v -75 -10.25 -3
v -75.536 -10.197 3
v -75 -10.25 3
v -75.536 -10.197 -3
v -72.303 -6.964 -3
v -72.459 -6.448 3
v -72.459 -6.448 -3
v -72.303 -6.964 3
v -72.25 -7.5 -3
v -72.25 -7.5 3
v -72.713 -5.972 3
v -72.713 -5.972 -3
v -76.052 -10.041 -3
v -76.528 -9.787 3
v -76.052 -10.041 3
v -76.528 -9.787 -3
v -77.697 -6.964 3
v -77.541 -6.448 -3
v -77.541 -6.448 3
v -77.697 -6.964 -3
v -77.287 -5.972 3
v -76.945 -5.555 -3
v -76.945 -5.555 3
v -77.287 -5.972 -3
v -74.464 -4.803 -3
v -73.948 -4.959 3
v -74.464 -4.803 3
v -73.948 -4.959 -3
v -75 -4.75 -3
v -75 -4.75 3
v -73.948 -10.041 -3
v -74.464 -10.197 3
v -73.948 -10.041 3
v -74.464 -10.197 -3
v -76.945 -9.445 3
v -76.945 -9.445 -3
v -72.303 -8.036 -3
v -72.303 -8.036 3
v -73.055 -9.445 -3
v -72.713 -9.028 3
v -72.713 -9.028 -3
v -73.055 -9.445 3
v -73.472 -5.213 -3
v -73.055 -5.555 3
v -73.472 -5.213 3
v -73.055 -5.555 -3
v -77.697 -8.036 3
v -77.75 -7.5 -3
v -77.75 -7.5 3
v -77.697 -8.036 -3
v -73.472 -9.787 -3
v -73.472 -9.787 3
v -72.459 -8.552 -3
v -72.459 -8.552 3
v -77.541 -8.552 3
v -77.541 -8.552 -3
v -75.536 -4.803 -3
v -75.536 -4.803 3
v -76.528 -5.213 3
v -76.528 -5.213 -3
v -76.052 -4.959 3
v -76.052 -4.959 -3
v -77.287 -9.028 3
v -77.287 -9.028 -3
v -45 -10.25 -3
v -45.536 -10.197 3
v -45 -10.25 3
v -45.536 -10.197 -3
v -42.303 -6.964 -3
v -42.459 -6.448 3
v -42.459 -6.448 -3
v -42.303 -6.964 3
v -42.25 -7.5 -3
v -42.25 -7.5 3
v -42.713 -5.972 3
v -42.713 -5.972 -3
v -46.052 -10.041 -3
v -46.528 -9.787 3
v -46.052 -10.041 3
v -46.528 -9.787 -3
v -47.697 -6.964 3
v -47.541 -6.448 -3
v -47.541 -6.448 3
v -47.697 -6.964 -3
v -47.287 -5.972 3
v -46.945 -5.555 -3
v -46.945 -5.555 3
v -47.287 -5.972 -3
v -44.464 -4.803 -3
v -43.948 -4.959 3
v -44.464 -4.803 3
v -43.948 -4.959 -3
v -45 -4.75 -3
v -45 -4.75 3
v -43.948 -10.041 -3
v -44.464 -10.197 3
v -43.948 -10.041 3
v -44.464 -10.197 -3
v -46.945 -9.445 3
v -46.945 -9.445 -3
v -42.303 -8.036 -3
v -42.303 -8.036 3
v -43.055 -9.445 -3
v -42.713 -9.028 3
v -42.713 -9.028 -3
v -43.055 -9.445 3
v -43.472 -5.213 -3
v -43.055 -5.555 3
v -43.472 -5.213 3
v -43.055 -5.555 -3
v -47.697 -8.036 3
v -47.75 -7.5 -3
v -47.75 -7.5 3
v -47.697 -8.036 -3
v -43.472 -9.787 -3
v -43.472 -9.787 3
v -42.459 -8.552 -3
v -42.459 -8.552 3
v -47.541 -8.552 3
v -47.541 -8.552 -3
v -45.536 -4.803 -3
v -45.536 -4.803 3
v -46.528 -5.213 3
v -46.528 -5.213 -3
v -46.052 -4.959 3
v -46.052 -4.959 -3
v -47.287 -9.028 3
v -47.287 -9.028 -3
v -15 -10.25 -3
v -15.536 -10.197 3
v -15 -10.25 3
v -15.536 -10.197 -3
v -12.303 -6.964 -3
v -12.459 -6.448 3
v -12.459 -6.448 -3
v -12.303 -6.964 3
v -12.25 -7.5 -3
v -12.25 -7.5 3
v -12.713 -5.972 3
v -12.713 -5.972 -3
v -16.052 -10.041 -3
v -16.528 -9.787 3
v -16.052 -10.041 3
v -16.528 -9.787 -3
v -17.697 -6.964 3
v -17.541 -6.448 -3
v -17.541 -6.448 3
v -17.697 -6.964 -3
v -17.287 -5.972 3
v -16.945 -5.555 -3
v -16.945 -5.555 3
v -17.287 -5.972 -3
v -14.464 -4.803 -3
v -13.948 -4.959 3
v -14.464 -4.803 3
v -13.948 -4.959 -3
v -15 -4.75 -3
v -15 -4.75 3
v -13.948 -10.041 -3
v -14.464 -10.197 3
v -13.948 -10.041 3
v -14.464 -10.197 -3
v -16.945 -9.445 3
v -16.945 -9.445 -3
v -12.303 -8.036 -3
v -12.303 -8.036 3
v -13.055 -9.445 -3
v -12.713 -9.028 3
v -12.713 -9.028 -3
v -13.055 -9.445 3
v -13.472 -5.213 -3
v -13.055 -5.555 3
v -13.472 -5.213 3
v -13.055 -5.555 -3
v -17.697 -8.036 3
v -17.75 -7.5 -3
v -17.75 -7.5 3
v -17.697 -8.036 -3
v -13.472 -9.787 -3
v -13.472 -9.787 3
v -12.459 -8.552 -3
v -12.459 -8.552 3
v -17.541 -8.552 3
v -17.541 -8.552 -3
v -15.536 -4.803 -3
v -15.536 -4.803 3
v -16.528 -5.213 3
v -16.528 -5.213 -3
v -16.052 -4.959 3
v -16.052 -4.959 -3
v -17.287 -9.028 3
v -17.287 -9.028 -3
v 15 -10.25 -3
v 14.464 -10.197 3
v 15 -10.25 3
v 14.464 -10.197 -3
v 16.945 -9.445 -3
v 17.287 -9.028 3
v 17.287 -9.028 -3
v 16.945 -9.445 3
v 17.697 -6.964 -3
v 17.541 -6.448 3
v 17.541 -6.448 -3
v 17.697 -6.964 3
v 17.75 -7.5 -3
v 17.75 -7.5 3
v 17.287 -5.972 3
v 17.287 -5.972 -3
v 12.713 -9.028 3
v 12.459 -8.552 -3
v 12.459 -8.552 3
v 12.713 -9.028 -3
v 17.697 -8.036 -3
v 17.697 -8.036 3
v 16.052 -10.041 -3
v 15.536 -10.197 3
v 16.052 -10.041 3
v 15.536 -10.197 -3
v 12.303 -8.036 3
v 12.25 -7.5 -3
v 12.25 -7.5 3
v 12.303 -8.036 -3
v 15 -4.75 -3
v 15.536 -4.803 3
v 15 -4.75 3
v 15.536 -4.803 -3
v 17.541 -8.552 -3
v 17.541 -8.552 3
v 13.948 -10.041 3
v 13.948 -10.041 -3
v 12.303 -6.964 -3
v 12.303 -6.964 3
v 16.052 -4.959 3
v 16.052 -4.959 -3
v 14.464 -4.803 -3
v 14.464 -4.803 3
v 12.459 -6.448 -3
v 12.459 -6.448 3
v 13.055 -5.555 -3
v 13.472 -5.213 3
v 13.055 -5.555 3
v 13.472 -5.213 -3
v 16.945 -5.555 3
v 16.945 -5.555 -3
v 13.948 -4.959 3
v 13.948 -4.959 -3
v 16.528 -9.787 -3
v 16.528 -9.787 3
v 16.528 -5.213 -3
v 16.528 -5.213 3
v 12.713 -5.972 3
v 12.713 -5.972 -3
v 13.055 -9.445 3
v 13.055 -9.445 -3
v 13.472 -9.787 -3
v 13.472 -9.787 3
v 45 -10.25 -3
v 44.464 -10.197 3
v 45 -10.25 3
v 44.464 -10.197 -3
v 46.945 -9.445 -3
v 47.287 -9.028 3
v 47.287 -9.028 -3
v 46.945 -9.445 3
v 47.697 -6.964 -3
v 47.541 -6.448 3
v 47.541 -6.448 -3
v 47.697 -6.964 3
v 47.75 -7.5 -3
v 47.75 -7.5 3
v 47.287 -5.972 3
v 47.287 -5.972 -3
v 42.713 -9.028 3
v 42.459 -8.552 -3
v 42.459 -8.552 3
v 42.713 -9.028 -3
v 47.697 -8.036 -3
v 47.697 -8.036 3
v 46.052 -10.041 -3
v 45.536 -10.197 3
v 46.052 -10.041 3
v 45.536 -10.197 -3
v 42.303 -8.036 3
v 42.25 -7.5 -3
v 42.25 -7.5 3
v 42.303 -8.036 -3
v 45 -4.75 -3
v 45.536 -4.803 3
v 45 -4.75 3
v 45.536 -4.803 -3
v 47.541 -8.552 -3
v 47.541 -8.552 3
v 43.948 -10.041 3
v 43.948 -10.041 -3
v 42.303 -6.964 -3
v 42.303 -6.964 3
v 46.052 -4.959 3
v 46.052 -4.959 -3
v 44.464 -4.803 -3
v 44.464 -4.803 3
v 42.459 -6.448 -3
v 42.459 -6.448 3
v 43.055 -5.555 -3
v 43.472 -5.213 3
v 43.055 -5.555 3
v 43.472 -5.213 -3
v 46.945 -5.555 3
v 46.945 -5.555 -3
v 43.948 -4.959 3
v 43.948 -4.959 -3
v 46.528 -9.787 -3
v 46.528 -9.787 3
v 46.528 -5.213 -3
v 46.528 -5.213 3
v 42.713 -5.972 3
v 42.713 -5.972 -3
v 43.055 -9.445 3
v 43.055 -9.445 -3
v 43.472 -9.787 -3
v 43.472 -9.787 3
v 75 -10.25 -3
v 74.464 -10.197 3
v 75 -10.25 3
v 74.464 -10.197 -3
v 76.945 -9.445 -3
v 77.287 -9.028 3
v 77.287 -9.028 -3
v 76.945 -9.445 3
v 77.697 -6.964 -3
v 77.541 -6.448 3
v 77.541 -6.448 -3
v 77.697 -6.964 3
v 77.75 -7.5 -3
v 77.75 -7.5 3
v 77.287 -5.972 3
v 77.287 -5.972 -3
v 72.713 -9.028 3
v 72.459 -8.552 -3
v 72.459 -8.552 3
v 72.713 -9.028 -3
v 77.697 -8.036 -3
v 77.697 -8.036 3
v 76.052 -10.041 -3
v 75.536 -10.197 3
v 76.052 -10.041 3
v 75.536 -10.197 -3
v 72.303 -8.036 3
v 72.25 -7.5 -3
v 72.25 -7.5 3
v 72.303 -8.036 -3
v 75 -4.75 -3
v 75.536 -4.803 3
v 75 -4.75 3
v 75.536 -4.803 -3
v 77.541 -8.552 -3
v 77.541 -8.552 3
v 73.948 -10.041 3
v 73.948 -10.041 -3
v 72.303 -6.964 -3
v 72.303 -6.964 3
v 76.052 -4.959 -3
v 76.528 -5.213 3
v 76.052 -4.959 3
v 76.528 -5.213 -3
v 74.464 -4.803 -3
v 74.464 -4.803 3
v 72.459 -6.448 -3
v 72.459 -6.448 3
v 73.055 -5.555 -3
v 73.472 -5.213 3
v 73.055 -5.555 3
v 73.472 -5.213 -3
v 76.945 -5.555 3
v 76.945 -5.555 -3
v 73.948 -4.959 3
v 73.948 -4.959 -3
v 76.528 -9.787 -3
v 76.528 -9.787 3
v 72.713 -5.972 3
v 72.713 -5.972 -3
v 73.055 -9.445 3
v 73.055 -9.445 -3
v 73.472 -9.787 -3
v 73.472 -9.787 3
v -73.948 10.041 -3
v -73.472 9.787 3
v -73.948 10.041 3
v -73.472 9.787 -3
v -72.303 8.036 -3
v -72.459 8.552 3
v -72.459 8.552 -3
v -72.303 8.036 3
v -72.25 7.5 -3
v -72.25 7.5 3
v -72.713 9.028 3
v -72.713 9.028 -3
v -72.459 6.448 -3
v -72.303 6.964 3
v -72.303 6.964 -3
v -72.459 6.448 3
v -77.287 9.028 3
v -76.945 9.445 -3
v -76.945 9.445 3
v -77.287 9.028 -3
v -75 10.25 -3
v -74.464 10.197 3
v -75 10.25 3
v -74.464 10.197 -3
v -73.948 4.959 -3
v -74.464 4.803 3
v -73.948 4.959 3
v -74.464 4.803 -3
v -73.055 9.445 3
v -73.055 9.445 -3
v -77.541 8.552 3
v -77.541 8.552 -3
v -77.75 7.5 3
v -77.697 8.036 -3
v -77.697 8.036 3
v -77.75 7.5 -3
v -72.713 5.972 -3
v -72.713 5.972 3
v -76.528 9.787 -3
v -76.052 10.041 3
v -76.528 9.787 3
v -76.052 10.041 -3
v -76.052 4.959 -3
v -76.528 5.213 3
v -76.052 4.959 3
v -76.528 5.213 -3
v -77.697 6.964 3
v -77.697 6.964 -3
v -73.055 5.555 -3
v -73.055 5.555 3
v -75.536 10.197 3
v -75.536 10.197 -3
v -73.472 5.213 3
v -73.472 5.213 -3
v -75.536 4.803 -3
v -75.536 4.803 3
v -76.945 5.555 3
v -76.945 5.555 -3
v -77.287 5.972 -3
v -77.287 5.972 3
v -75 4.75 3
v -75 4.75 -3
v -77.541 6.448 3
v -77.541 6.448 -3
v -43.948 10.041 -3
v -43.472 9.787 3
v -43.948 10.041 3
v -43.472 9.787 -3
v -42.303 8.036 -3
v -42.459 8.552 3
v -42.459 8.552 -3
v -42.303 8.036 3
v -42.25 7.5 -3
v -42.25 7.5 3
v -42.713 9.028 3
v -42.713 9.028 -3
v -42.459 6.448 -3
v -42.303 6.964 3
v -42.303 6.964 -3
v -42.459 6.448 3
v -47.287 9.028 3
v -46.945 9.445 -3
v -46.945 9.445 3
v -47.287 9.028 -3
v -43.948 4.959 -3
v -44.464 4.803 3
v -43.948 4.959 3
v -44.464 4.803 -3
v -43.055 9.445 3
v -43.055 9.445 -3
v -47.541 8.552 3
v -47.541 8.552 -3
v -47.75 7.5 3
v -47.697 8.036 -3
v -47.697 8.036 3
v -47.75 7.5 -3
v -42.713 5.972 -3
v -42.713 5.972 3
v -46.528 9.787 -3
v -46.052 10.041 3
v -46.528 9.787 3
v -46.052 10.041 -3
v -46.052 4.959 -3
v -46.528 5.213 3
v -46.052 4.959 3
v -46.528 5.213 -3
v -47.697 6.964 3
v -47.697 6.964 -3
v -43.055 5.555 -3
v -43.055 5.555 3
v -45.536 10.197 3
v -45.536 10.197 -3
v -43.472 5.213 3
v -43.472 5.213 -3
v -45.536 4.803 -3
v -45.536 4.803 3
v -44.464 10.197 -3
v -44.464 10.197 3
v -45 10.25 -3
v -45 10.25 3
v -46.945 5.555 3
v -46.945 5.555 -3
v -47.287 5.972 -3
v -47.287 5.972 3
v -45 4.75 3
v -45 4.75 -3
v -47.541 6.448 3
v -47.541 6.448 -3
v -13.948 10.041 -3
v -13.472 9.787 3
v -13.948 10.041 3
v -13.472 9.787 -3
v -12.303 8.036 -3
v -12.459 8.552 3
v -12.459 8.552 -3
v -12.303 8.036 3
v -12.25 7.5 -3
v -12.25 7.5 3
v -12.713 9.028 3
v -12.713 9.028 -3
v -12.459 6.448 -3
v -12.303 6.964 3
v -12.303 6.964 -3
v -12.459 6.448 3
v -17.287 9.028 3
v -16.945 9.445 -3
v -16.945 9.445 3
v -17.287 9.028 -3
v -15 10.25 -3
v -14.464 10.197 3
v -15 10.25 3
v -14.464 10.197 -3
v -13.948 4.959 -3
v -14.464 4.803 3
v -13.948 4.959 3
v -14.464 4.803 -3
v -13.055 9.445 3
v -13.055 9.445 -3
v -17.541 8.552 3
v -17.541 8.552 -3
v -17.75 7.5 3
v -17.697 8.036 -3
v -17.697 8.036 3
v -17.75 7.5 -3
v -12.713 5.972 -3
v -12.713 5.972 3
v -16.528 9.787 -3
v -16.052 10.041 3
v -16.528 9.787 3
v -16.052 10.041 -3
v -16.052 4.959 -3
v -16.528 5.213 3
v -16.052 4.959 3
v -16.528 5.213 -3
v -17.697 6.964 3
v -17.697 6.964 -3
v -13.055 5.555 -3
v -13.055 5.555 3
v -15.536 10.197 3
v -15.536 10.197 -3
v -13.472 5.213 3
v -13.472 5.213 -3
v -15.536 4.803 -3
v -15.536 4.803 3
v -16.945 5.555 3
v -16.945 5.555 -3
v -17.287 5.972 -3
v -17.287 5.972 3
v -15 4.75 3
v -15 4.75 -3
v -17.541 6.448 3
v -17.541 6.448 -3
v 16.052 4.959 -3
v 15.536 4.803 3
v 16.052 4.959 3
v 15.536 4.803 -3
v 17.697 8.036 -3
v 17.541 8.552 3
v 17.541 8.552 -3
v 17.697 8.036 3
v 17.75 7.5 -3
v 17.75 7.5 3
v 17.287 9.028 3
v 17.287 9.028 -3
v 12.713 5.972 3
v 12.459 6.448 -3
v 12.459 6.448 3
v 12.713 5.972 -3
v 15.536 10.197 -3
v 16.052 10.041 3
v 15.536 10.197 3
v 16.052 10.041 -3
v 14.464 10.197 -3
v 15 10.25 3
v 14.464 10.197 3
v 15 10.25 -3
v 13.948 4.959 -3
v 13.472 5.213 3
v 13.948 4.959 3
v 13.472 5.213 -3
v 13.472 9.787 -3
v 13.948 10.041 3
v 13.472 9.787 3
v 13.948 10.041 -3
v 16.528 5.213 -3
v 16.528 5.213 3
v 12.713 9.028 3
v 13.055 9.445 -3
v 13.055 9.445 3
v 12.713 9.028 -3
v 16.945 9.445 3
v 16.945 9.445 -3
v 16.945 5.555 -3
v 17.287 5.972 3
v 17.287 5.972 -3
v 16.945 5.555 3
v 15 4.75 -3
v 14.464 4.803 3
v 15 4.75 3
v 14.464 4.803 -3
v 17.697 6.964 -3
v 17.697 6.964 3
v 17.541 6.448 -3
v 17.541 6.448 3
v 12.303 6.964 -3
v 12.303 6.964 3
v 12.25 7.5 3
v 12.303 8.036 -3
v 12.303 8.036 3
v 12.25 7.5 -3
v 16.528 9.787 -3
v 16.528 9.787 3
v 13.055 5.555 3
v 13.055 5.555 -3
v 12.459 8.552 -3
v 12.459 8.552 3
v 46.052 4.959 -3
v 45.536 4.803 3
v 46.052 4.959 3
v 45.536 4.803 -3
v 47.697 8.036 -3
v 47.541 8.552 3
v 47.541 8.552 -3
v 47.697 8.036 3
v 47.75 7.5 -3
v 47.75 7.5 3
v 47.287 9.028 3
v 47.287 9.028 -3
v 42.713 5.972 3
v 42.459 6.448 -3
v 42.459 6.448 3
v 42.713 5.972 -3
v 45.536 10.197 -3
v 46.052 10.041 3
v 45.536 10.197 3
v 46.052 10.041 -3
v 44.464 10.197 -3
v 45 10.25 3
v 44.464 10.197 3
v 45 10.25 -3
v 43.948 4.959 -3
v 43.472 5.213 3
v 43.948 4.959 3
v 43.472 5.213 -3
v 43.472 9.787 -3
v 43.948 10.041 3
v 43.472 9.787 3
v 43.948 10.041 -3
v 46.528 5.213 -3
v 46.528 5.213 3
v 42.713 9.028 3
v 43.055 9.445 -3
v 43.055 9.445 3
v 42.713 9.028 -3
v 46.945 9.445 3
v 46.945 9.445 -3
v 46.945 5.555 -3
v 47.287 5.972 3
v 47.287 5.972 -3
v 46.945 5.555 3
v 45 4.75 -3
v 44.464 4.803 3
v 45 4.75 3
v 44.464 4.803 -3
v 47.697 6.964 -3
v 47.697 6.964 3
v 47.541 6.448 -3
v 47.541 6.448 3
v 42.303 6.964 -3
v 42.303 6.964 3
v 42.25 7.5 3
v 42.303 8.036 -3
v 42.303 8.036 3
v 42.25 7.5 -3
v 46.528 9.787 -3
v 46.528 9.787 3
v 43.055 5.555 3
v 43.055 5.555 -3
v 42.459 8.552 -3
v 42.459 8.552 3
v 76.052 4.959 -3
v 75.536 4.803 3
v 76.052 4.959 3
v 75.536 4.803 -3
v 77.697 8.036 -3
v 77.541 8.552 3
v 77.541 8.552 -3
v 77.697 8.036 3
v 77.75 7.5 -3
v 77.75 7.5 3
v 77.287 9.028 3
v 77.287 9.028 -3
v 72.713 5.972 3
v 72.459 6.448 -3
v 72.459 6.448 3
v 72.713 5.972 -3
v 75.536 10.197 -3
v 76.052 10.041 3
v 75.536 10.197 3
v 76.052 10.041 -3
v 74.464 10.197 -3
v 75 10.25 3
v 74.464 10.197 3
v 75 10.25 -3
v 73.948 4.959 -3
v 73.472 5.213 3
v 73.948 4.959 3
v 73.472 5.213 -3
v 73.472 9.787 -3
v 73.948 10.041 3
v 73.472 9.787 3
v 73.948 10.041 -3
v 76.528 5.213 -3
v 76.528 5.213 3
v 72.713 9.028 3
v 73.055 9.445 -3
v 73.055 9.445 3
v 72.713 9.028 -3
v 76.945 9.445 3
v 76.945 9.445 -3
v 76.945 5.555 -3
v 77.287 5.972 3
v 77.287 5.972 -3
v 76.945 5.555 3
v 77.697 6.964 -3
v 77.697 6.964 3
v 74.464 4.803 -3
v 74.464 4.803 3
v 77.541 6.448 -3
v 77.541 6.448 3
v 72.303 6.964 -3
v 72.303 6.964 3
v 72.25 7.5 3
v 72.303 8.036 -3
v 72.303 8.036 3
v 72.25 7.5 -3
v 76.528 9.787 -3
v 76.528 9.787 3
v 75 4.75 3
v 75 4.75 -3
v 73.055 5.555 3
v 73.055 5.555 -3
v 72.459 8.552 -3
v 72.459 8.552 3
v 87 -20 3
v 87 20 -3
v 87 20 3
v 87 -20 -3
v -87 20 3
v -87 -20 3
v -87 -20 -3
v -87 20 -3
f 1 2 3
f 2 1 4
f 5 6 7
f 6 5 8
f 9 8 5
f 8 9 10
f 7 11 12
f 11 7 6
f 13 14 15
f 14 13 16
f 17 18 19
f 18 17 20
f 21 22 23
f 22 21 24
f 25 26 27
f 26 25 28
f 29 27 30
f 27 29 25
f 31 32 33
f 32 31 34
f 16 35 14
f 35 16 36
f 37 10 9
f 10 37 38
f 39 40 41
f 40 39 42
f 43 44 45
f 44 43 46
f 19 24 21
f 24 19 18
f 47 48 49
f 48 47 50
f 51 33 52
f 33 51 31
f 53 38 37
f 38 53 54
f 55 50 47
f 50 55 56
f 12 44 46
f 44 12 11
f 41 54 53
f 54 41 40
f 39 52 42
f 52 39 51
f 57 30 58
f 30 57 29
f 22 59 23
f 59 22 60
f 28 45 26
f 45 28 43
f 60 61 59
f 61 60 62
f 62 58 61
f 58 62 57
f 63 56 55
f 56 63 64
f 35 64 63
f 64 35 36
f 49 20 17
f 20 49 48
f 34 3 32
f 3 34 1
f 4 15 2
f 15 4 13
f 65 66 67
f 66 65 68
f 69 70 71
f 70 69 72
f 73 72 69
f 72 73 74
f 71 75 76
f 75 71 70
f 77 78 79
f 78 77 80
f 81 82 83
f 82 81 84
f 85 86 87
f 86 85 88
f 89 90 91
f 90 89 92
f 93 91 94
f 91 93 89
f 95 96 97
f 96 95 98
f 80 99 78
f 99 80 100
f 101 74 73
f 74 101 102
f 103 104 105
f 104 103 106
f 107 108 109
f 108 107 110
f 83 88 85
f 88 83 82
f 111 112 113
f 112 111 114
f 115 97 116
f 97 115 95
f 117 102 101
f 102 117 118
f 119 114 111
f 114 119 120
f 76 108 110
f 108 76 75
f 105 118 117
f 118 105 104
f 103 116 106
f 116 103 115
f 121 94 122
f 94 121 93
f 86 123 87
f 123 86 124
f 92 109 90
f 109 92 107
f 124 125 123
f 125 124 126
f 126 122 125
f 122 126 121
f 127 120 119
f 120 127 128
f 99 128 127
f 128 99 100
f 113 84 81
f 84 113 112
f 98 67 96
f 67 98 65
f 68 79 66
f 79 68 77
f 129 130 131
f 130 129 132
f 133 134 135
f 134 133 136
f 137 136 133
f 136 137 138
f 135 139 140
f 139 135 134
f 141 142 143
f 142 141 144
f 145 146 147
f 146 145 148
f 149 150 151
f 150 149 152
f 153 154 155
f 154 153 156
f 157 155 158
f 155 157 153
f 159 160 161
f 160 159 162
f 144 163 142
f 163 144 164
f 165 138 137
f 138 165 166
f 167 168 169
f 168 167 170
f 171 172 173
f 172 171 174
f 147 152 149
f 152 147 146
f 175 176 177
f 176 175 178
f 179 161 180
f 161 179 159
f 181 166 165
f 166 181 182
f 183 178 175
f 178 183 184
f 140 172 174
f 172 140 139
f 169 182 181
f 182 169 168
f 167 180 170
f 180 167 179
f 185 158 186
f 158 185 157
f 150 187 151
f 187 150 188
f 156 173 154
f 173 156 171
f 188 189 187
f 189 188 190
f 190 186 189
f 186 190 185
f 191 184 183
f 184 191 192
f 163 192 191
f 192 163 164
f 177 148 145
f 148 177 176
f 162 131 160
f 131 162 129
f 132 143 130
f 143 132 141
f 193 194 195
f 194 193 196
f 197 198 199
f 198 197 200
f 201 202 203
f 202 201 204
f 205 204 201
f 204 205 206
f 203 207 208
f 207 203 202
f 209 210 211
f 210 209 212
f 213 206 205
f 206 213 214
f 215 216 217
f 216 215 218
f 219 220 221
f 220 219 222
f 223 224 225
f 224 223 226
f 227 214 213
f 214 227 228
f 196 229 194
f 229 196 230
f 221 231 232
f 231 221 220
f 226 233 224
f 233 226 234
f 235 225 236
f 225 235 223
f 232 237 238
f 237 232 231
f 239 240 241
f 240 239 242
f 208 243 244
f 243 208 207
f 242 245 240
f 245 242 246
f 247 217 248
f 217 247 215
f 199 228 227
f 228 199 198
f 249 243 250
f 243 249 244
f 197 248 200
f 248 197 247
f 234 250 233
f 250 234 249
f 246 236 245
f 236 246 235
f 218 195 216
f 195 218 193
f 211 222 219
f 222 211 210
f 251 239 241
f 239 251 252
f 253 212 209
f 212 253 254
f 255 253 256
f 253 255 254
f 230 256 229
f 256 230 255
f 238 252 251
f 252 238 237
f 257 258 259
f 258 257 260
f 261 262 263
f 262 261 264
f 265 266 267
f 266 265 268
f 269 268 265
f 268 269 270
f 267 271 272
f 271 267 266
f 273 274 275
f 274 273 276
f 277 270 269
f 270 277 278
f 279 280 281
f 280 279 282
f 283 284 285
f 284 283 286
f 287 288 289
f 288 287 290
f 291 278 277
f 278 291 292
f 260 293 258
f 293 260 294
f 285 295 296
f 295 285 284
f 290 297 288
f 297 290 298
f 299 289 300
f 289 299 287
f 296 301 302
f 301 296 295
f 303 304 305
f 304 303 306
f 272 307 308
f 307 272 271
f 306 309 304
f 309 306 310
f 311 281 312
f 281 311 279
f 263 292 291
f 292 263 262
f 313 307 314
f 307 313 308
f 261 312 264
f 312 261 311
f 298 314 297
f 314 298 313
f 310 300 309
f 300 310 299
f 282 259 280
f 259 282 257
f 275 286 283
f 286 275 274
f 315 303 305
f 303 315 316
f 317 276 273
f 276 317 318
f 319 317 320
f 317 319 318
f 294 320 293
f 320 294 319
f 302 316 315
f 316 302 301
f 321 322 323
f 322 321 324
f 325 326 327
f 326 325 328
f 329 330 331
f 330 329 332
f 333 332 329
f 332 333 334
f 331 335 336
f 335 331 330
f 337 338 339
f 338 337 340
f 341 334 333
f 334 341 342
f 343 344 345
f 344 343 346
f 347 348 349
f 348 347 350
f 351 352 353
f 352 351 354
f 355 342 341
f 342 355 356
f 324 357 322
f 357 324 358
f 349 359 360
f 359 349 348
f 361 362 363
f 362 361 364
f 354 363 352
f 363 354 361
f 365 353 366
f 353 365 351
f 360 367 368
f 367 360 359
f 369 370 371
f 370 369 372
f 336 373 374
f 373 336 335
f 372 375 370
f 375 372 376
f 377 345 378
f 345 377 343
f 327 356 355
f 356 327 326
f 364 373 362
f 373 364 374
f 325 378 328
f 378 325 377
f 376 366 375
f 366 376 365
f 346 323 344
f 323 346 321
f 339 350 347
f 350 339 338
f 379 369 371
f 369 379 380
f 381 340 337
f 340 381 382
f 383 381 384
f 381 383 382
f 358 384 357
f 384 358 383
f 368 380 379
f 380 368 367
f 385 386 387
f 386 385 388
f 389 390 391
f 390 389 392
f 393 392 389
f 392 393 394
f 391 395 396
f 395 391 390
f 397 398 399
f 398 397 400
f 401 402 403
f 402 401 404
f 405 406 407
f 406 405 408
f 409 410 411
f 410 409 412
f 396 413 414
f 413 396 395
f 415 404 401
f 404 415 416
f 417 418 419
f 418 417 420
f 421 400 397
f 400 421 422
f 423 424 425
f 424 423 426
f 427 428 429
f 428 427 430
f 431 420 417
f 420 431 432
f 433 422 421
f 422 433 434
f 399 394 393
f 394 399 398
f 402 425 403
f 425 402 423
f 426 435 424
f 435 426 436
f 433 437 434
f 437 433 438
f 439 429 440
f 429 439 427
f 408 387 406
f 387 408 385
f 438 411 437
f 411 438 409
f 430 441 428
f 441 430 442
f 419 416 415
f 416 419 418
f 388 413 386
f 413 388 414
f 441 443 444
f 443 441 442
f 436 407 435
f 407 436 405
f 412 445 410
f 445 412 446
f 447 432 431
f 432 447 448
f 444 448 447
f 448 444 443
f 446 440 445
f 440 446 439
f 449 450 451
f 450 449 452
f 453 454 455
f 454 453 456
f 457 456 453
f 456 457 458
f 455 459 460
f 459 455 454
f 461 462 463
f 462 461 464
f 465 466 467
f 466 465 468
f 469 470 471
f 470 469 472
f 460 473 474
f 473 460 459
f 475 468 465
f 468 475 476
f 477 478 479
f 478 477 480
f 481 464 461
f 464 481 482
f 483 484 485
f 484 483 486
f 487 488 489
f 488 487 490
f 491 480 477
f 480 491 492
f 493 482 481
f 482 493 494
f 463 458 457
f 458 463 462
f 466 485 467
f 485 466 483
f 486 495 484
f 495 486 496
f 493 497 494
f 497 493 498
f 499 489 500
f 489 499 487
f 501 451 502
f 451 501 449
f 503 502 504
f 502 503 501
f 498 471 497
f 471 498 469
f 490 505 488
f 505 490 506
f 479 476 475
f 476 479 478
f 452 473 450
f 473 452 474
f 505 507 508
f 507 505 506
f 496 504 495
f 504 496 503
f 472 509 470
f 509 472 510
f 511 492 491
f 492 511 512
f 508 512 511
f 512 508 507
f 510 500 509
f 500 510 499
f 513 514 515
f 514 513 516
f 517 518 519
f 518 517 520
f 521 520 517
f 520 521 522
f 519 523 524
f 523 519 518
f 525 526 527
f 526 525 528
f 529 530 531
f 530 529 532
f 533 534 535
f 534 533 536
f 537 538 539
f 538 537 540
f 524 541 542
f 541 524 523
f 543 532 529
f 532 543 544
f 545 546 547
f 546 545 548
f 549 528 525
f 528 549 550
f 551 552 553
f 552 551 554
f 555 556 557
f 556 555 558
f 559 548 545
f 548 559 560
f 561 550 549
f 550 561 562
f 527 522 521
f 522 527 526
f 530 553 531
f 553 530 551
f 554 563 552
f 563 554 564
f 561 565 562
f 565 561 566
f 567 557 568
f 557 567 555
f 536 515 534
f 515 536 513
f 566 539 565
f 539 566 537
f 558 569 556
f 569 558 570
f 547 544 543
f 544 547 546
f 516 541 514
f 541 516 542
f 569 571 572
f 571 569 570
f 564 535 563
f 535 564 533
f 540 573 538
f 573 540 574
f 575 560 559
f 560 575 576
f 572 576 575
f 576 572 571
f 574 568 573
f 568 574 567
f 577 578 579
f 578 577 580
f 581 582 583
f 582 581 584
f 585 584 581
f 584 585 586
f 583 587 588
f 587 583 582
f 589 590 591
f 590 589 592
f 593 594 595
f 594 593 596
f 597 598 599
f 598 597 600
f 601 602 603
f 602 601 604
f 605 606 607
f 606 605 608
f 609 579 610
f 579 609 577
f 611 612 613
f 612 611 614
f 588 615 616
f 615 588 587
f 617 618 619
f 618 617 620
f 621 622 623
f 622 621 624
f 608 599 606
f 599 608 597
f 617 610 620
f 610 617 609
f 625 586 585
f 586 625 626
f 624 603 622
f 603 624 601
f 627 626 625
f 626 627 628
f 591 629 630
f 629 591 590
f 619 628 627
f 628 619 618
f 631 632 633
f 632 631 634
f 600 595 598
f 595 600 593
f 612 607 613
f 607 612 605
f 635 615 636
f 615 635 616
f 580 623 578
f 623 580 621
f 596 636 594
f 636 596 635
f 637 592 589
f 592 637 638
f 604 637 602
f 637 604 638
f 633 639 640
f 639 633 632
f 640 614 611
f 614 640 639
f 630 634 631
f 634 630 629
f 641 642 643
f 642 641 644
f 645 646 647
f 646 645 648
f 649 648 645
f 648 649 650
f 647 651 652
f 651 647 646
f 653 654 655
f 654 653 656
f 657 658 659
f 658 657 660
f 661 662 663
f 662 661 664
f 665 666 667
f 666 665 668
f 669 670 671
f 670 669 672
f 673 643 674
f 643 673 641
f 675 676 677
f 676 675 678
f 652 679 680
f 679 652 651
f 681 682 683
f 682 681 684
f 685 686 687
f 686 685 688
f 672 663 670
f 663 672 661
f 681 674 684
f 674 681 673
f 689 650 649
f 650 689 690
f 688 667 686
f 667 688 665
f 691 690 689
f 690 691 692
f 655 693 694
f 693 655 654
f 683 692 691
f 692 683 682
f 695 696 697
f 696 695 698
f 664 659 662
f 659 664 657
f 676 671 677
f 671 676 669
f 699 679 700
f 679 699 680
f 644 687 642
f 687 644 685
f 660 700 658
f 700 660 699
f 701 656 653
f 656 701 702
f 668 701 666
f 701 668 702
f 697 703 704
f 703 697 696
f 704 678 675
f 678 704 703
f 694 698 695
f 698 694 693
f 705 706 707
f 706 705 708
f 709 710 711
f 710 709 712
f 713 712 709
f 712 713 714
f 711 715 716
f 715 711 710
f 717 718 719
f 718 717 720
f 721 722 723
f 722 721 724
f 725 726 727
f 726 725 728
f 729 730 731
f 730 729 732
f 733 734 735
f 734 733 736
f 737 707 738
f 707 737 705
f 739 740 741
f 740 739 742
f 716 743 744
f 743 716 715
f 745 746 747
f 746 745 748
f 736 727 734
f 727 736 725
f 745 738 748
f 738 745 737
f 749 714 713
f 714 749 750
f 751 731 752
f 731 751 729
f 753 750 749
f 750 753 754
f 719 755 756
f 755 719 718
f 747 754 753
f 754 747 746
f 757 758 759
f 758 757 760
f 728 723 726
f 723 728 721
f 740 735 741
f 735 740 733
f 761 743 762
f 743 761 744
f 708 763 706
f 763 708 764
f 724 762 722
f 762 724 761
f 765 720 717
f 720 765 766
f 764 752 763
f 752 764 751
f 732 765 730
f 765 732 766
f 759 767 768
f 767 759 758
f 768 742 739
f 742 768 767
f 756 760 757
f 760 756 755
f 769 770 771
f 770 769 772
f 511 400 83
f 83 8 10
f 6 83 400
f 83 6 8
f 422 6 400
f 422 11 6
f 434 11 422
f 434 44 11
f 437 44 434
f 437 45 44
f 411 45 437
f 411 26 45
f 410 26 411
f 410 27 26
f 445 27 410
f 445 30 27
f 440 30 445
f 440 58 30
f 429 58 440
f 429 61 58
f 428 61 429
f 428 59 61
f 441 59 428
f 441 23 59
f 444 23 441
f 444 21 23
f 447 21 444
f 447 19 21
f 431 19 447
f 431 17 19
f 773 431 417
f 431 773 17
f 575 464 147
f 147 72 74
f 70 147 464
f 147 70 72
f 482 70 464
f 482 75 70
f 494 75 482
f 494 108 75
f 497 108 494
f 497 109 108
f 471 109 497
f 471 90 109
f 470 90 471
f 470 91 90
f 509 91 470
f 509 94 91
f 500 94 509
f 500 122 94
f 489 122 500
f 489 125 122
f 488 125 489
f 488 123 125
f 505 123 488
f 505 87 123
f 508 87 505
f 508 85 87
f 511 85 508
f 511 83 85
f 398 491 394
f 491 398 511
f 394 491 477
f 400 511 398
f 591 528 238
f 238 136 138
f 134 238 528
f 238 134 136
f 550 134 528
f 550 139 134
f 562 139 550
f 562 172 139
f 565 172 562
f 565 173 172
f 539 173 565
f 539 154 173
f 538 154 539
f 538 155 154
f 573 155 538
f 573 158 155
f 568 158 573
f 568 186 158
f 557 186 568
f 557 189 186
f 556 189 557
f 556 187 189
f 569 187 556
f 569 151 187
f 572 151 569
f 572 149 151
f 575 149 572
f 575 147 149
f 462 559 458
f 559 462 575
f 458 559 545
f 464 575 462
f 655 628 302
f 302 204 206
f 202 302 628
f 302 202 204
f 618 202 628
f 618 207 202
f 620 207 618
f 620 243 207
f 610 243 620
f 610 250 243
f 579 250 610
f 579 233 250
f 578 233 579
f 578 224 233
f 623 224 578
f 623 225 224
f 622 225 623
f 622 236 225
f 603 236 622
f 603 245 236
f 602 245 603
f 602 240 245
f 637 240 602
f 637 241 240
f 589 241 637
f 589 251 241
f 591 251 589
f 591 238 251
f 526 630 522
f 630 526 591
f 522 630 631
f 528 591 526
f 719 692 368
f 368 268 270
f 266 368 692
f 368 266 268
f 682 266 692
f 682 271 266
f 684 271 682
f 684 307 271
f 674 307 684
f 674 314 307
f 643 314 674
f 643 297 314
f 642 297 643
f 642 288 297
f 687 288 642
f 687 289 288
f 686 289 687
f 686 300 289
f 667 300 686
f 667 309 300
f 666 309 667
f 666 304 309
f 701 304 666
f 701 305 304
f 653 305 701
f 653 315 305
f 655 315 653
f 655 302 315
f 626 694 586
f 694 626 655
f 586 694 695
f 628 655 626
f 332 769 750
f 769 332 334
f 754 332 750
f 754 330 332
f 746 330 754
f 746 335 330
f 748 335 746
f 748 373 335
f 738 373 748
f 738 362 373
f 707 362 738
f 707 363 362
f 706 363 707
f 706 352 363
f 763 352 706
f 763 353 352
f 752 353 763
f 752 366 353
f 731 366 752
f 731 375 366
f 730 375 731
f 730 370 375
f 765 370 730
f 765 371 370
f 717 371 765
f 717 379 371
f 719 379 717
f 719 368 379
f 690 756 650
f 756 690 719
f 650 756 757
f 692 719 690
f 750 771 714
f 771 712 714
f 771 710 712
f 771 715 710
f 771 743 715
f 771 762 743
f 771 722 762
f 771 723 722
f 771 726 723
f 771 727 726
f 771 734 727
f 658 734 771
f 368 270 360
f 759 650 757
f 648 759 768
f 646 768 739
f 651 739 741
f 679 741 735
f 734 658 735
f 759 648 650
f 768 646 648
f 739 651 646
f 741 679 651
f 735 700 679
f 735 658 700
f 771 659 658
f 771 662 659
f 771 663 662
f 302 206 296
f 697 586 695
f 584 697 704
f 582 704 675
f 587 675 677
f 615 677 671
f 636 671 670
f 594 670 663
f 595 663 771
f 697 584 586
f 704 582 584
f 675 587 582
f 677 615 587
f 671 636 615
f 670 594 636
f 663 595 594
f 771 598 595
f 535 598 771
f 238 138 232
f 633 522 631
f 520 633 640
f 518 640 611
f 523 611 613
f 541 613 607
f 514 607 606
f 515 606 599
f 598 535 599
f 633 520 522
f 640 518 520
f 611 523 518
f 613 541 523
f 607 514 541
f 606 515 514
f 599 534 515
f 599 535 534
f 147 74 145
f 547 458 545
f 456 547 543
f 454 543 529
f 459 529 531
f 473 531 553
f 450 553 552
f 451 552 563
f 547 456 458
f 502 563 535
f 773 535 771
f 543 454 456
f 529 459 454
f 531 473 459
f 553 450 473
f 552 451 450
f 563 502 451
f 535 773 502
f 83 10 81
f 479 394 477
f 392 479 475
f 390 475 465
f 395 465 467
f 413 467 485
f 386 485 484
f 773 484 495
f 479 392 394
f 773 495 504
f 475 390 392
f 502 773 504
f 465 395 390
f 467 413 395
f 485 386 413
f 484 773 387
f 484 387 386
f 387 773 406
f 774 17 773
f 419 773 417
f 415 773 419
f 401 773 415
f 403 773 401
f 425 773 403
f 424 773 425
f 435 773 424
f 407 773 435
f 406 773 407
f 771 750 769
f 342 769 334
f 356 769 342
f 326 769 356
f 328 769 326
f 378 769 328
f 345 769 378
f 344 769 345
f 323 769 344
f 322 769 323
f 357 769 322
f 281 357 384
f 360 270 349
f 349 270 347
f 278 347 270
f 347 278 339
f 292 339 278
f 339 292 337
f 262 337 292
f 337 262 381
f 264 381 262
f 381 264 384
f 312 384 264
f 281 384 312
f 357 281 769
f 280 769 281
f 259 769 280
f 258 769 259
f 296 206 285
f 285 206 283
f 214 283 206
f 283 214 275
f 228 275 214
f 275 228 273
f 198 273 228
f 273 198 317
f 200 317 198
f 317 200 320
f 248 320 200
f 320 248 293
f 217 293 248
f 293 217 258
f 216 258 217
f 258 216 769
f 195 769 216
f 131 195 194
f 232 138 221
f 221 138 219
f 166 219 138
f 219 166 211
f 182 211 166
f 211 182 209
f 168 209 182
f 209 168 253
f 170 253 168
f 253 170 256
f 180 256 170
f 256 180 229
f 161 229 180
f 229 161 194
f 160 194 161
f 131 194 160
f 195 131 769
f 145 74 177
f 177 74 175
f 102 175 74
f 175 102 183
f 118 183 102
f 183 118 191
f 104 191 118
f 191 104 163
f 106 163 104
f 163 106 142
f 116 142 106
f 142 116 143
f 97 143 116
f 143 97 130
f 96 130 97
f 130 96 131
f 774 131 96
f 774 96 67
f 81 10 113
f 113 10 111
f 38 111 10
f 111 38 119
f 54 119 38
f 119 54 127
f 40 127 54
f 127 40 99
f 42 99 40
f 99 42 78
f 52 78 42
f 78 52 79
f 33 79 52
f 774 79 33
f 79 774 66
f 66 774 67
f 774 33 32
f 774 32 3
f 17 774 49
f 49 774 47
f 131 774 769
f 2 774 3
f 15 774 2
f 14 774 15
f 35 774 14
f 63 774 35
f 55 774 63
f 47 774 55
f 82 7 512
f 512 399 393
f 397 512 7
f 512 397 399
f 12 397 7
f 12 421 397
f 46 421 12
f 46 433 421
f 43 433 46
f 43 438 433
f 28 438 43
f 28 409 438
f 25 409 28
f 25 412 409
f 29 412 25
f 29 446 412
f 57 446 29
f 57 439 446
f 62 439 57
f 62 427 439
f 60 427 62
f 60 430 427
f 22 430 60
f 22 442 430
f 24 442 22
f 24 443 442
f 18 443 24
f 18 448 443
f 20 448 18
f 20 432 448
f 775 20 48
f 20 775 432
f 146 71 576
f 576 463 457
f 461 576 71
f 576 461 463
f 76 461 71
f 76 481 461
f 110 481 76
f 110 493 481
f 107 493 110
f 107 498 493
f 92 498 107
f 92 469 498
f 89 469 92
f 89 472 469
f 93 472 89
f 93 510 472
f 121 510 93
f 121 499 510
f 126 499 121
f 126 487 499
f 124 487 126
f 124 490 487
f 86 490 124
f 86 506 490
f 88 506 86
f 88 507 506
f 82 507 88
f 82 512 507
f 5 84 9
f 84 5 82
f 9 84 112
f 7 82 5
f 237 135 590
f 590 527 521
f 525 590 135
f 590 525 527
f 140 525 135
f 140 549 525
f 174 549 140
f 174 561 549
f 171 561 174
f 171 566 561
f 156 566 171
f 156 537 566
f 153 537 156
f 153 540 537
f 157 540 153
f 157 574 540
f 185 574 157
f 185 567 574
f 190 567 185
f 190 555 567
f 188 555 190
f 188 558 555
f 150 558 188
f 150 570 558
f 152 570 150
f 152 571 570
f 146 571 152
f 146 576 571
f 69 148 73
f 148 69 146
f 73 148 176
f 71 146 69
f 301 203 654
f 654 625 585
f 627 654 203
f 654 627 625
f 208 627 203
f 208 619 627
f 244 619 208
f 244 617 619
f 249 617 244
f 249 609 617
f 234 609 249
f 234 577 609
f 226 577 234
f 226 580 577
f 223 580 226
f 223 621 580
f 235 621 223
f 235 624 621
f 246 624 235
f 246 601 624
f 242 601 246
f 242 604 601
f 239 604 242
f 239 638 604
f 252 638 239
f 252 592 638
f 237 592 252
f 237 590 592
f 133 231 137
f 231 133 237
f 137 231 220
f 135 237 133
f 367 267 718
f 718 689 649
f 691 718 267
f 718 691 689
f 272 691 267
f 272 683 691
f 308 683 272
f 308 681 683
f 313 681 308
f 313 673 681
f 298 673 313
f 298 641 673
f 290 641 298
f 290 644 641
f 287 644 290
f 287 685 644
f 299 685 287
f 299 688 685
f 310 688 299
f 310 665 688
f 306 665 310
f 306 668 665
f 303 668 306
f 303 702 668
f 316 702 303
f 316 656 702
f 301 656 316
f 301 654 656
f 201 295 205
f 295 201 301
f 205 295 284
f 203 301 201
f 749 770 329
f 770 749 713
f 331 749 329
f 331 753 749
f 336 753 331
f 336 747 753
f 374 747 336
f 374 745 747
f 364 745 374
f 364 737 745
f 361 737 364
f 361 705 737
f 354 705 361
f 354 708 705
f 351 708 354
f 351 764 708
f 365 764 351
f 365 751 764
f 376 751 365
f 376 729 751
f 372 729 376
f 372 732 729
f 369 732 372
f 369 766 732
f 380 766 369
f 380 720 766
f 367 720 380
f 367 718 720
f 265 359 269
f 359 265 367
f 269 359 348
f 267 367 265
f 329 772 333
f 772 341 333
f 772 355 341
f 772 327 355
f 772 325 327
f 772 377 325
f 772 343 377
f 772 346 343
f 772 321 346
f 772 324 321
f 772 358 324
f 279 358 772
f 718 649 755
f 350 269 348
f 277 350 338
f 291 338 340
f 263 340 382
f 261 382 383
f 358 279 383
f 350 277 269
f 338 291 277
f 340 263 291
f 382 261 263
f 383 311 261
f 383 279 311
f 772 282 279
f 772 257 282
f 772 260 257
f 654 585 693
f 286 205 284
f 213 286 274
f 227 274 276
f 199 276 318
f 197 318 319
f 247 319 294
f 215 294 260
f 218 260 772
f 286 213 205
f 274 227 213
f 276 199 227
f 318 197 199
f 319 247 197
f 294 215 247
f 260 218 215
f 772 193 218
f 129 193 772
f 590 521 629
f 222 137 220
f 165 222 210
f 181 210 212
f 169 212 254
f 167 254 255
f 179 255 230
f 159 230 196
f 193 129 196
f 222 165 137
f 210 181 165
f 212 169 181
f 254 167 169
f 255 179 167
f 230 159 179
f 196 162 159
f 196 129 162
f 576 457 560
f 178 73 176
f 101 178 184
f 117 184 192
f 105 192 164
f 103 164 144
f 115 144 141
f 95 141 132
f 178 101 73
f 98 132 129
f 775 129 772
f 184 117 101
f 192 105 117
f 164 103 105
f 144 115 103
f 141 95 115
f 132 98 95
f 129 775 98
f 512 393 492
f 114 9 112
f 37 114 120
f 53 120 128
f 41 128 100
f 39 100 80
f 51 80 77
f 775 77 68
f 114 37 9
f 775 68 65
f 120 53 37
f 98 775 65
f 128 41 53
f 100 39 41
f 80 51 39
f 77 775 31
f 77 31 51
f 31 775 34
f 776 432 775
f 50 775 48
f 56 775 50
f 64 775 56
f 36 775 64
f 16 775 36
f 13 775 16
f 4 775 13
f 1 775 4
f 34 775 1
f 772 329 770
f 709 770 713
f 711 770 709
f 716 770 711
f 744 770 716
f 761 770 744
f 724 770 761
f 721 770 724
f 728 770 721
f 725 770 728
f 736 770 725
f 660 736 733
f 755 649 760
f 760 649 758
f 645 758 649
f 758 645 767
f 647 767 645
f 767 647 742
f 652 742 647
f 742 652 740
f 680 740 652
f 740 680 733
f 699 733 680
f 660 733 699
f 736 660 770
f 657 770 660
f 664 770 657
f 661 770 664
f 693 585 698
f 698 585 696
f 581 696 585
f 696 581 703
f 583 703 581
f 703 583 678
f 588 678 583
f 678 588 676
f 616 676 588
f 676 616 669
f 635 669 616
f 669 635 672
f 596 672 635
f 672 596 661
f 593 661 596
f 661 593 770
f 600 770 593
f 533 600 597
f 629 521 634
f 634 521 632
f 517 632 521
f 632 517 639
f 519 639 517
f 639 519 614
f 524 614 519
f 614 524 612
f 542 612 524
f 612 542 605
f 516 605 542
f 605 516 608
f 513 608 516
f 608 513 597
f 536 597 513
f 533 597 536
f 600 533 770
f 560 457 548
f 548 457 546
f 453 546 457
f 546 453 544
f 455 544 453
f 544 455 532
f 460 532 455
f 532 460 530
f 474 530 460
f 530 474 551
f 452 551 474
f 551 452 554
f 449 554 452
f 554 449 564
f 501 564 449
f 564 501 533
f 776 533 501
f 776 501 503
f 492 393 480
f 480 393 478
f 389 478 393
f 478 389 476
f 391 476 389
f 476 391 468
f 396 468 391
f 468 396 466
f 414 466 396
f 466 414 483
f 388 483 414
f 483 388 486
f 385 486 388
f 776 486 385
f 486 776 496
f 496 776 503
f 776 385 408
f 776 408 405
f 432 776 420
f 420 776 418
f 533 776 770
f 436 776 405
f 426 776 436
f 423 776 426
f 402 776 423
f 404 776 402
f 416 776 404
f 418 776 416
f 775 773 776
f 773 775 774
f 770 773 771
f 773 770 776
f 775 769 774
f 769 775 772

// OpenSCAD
$fn = 32;

// ----------------------------------------------------------------------
// Hole bar, 6 x Ø5.5
// tworows layout, 12 mm edge offset
// ----------------------------------------------------------------------

// --- parameters (mm) ---
bar_w = 40;       // bar width (Y)
bar_t = 6;        // bar thickness (Z)
holes = 6;        // holes per row
hole_d = 5.5;     // hole diameter
edge = 12;        // offset from the bar end to the first hole
pitch = 30;       // pitch between neighbouring holes
row_offset = 15;  // distance between the two rows

// --- derived feature positions (mm) ---
span = (holes - 1) * pitch;   // = 150   distance between the end holes
bar_l = span + 2 * edge;      // = 174   overall bar length
start_x = -bar_l / 2 + edge;  // = -75   X of the first hole
feature_centers = [
  [start_x + 0 * pitch, -row_offset / 2],
  [start_x + 1 * pitch, -row_offset / 2],
  [start_x + 2 * pitch, -row_offset / 2],
  [start_x + 3 * pitch, -row_offset / 2],
  [start_x + 4 * pitch, -row_offset / 2],
  [start_x + 5 * pitch, -row_offset / 2]
];   // hole centres of the first row
row2_centers = [
  [start_x + 0 * pitch, row_offset / 2],
  [start_x + 1 * pitch, row_offset / 2],
  [start_x + 2 * pitch, row_offset / 2],
  [start_x + 3 * pitch, row_offset / 2],
  [start_x + 4 * pitch, row_offset / 2],
  [start_x + 5 * pitch, row_offset / 2]
];   // hole centres of the second row

// bar with two rows of holes, both read from their own centre arrays
difference() {
  translate([-bar_l / 2, -bar_w / 2, -bar_t / 2]) cube([bar_l, bar_w, bar_t]);
  for (centre = feature_centers)
    translate([centre[0], centre[1], 0])
      cylinder(d = hole_d, h = bar_t + 2, center = true);
  for (centre = row2_centers)
    translate([centre[0], centre[1], 0])
      cylinder(d = hole_d, h = bar_t + 2, center = true);
}
